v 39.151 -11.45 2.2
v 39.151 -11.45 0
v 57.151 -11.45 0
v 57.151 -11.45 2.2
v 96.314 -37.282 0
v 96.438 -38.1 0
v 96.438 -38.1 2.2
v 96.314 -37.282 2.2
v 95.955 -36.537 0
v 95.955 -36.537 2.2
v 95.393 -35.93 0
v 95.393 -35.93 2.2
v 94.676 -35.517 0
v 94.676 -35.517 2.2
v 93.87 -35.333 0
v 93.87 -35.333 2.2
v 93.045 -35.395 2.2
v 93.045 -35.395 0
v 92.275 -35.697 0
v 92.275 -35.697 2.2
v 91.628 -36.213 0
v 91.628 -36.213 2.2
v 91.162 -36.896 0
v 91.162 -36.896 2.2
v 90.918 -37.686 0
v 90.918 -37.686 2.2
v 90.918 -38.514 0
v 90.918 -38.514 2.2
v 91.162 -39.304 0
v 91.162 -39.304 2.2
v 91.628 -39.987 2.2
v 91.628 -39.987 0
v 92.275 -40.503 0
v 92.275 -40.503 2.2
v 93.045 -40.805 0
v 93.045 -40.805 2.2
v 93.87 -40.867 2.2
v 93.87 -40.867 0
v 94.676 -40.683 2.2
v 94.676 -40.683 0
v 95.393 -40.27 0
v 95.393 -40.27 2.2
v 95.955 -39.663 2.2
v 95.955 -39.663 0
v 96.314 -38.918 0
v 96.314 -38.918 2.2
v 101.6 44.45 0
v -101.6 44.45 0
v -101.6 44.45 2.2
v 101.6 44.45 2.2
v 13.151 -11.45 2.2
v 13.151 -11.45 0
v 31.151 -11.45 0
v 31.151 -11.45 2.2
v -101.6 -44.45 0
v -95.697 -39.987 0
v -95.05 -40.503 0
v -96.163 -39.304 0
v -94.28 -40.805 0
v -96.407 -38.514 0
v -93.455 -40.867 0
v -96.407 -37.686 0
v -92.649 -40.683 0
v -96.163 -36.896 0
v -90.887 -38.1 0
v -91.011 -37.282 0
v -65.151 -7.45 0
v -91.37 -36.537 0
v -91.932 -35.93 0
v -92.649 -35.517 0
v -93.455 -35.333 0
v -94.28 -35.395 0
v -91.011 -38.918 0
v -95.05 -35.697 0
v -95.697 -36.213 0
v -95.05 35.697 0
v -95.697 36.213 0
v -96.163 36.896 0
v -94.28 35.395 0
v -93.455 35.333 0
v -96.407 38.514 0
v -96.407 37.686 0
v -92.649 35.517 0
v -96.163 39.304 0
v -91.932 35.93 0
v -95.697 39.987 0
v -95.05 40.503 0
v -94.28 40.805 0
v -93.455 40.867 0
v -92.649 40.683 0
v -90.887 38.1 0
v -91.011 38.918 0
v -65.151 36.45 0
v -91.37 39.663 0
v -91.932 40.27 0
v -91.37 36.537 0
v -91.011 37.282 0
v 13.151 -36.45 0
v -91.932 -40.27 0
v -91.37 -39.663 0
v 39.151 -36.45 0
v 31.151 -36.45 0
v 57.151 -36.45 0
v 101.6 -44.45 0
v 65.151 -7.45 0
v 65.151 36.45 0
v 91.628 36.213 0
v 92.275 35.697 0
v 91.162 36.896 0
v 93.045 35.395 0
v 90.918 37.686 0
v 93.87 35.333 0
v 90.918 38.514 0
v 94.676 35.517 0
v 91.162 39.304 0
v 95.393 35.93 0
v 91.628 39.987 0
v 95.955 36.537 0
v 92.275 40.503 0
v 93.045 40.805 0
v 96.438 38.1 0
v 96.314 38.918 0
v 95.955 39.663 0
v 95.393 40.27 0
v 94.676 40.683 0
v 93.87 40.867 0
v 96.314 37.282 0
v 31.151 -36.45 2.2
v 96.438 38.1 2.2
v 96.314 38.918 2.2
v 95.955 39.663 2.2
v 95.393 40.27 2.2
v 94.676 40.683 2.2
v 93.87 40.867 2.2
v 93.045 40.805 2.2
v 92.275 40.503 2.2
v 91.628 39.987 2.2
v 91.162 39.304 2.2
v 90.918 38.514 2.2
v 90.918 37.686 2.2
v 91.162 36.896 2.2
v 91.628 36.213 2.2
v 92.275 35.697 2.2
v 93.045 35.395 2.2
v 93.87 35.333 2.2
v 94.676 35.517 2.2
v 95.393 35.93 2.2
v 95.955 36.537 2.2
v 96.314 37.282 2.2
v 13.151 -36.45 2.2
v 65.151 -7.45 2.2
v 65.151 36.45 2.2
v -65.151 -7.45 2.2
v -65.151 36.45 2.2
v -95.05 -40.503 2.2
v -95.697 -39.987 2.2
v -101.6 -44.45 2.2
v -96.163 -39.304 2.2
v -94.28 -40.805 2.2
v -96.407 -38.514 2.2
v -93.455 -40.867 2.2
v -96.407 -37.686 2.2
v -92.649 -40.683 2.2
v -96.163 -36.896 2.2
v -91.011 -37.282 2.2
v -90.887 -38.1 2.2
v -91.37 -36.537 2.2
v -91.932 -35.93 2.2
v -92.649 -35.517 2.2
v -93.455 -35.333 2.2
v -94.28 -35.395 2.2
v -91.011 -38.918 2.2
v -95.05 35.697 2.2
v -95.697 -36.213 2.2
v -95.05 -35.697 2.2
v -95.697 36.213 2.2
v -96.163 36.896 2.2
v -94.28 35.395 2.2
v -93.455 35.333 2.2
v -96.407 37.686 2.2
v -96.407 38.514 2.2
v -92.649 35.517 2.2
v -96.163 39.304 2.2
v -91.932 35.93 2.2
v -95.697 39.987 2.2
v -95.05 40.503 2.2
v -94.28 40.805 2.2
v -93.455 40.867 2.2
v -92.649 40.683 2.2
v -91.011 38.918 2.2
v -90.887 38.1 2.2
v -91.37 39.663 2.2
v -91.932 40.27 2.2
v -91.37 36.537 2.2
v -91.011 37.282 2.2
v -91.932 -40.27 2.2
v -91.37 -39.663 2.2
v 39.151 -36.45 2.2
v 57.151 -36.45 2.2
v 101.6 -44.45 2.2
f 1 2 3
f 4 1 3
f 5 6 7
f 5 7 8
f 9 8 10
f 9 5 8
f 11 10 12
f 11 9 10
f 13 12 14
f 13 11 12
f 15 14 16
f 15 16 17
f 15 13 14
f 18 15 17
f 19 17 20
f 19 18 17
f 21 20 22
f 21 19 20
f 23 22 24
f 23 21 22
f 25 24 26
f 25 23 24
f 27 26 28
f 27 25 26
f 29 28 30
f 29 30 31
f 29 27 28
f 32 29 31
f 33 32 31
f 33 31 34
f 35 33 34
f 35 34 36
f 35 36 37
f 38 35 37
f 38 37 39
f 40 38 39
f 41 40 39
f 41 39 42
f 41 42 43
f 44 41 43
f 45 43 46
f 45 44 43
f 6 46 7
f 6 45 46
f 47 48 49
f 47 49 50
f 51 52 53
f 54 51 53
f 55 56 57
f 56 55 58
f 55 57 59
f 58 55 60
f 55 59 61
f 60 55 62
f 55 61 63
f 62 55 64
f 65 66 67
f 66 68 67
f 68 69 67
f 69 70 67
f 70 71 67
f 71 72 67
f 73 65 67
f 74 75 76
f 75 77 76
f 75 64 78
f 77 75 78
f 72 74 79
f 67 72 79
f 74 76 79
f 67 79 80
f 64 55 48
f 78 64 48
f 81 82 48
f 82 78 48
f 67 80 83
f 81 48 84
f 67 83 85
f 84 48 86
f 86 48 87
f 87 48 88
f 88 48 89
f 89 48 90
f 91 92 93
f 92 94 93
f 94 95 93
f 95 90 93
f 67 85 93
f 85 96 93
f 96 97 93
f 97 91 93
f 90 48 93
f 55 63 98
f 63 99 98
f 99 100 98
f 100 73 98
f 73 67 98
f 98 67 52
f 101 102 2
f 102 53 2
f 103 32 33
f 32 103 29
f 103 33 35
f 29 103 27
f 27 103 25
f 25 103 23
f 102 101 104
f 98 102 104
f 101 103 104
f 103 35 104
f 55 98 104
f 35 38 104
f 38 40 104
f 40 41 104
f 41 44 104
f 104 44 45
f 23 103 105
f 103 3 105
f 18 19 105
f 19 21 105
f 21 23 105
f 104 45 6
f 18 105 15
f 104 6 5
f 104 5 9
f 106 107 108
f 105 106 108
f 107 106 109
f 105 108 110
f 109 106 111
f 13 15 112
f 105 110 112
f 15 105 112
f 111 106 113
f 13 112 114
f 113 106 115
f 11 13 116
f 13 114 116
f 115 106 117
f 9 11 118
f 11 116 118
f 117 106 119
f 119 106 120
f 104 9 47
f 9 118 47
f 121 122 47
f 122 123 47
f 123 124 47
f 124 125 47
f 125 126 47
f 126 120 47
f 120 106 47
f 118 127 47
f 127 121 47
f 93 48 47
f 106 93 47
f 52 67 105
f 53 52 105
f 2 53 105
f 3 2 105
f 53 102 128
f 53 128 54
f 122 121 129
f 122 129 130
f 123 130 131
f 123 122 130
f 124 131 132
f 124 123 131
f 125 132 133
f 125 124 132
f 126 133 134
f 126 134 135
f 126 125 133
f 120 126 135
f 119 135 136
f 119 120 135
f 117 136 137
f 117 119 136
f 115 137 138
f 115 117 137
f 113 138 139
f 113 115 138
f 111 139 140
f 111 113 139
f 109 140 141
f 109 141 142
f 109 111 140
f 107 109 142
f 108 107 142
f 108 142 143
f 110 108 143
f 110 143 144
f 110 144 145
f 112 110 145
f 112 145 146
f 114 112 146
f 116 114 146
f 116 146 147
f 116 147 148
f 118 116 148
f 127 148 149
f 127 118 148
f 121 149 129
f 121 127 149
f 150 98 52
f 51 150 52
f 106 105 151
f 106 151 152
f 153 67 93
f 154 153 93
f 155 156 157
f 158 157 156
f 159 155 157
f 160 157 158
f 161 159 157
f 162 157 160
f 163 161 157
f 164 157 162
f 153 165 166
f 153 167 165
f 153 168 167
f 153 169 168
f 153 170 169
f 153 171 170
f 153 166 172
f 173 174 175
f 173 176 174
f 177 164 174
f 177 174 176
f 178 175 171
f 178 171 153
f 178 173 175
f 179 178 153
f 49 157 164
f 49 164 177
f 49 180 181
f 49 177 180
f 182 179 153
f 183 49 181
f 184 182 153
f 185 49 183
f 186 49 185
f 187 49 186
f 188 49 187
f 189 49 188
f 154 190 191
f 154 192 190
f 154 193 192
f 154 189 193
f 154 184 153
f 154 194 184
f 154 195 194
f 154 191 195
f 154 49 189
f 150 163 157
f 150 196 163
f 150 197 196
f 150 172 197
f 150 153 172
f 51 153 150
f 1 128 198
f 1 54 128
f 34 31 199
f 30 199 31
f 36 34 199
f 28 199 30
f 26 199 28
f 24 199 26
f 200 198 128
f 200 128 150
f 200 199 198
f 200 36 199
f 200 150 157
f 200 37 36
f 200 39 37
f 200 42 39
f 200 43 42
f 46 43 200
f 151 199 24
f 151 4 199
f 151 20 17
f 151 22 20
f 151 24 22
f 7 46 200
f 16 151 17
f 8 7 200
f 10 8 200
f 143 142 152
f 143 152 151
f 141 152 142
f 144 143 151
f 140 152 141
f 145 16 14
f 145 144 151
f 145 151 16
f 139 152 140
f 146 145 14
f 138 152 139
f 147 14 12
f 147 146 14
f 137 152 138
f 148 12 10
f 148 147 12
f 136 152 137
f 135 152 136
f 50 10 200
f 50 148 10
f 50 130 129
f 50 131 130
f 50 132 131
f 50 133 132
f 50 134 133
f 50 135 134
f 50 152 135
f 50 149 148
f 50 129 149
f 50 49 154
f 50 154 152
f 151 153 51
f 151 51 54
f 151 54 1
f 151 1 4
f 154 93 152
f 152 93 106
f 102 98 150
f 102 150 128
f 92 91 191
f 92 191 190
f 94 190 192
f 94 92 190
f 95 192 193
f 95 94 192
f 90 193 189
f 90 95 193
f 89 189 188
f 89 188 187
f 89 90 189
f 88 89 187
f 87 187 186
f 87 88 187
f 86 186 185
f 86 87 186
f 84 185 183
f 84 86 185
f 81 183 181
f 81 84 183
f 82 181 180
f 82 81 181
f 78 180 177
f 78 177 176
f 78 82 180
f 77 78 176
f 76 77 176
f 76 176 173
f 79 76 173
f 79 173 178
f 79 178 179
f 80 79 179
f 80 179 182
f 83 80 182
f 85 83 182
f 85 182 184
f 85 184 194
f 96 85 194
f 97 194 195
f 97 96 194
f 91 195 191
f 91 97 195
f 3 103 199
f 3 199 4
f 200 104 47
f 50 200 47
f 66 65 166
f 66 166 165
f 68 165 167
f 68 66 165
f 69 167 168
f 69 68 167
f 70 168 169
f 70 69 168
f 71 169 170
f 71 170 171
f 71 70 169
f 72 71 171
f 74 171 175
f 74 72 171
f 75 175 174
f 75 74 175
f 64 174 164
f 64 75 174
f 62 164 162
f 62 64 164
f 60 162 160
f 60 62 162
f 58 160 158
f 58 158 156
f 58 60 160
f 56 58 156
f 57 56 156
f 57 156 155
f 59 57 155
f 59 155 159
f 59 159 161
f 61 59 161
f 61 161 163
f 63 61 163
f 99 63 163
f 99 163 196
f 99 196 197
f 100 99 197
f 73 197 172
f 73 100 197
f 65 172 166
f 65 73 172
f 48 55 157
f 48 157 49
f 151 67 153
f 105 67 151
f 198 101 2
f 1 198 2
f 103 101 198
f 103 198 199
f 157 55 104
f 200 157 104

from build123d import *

# Parameters (mm, degrees)
SKETCH_W   = 203.2
SKETCH_H   = 88.9
SKETCH_R   = 2.775
SKETCH_W_2 = 130.302
SKETCH_H_2 = 43.9
SKETCH_W_3 = 18
SKETCH_H_3 = 25
PAD_DEPTH  = 2.2


with BuildPart() as part:
    # Sketch → Pad (new body)
    with BuildSketch(Plane.XY):
        Rectangle(SKETCH_W, SKETCH_H)
        with Locations((-93.6625, 38.1)):
            Circle(SKETCH_R, mode=Mode.SUBTRACT)
        with Locations((-93.6625, -38.1)):
            Circle(SKETCH_R, mode=Mode.SUBTRACT)
        with Locations((93.6625, 38.1)):
            Circle(SKETCH_R, mode=Mode.SUBTRACT)
        with Locations((93.6625, -38.1)):
            Circle(SKETCH_R, mode=Mode.SUBTRACT)
        with Locations((0, 14.5)):
            Rectangle(SKETCH_W_2, SKETCH_H_2, mode=Mode.SUBTRACT)
        with Locations((48.151, -23.95)):
            Rectangle(SKETCH_W_3, SKETCH_H_3, mode=Mode.SUBTRACT)
        with Locations((22.151, -23.95)):
            Rectangle(SKETCH_W_3, SKETCH_H_3, mode=Mode.SUBTRACT)
    extrude(amount=PAD_DEPTH)


solid = part.part
